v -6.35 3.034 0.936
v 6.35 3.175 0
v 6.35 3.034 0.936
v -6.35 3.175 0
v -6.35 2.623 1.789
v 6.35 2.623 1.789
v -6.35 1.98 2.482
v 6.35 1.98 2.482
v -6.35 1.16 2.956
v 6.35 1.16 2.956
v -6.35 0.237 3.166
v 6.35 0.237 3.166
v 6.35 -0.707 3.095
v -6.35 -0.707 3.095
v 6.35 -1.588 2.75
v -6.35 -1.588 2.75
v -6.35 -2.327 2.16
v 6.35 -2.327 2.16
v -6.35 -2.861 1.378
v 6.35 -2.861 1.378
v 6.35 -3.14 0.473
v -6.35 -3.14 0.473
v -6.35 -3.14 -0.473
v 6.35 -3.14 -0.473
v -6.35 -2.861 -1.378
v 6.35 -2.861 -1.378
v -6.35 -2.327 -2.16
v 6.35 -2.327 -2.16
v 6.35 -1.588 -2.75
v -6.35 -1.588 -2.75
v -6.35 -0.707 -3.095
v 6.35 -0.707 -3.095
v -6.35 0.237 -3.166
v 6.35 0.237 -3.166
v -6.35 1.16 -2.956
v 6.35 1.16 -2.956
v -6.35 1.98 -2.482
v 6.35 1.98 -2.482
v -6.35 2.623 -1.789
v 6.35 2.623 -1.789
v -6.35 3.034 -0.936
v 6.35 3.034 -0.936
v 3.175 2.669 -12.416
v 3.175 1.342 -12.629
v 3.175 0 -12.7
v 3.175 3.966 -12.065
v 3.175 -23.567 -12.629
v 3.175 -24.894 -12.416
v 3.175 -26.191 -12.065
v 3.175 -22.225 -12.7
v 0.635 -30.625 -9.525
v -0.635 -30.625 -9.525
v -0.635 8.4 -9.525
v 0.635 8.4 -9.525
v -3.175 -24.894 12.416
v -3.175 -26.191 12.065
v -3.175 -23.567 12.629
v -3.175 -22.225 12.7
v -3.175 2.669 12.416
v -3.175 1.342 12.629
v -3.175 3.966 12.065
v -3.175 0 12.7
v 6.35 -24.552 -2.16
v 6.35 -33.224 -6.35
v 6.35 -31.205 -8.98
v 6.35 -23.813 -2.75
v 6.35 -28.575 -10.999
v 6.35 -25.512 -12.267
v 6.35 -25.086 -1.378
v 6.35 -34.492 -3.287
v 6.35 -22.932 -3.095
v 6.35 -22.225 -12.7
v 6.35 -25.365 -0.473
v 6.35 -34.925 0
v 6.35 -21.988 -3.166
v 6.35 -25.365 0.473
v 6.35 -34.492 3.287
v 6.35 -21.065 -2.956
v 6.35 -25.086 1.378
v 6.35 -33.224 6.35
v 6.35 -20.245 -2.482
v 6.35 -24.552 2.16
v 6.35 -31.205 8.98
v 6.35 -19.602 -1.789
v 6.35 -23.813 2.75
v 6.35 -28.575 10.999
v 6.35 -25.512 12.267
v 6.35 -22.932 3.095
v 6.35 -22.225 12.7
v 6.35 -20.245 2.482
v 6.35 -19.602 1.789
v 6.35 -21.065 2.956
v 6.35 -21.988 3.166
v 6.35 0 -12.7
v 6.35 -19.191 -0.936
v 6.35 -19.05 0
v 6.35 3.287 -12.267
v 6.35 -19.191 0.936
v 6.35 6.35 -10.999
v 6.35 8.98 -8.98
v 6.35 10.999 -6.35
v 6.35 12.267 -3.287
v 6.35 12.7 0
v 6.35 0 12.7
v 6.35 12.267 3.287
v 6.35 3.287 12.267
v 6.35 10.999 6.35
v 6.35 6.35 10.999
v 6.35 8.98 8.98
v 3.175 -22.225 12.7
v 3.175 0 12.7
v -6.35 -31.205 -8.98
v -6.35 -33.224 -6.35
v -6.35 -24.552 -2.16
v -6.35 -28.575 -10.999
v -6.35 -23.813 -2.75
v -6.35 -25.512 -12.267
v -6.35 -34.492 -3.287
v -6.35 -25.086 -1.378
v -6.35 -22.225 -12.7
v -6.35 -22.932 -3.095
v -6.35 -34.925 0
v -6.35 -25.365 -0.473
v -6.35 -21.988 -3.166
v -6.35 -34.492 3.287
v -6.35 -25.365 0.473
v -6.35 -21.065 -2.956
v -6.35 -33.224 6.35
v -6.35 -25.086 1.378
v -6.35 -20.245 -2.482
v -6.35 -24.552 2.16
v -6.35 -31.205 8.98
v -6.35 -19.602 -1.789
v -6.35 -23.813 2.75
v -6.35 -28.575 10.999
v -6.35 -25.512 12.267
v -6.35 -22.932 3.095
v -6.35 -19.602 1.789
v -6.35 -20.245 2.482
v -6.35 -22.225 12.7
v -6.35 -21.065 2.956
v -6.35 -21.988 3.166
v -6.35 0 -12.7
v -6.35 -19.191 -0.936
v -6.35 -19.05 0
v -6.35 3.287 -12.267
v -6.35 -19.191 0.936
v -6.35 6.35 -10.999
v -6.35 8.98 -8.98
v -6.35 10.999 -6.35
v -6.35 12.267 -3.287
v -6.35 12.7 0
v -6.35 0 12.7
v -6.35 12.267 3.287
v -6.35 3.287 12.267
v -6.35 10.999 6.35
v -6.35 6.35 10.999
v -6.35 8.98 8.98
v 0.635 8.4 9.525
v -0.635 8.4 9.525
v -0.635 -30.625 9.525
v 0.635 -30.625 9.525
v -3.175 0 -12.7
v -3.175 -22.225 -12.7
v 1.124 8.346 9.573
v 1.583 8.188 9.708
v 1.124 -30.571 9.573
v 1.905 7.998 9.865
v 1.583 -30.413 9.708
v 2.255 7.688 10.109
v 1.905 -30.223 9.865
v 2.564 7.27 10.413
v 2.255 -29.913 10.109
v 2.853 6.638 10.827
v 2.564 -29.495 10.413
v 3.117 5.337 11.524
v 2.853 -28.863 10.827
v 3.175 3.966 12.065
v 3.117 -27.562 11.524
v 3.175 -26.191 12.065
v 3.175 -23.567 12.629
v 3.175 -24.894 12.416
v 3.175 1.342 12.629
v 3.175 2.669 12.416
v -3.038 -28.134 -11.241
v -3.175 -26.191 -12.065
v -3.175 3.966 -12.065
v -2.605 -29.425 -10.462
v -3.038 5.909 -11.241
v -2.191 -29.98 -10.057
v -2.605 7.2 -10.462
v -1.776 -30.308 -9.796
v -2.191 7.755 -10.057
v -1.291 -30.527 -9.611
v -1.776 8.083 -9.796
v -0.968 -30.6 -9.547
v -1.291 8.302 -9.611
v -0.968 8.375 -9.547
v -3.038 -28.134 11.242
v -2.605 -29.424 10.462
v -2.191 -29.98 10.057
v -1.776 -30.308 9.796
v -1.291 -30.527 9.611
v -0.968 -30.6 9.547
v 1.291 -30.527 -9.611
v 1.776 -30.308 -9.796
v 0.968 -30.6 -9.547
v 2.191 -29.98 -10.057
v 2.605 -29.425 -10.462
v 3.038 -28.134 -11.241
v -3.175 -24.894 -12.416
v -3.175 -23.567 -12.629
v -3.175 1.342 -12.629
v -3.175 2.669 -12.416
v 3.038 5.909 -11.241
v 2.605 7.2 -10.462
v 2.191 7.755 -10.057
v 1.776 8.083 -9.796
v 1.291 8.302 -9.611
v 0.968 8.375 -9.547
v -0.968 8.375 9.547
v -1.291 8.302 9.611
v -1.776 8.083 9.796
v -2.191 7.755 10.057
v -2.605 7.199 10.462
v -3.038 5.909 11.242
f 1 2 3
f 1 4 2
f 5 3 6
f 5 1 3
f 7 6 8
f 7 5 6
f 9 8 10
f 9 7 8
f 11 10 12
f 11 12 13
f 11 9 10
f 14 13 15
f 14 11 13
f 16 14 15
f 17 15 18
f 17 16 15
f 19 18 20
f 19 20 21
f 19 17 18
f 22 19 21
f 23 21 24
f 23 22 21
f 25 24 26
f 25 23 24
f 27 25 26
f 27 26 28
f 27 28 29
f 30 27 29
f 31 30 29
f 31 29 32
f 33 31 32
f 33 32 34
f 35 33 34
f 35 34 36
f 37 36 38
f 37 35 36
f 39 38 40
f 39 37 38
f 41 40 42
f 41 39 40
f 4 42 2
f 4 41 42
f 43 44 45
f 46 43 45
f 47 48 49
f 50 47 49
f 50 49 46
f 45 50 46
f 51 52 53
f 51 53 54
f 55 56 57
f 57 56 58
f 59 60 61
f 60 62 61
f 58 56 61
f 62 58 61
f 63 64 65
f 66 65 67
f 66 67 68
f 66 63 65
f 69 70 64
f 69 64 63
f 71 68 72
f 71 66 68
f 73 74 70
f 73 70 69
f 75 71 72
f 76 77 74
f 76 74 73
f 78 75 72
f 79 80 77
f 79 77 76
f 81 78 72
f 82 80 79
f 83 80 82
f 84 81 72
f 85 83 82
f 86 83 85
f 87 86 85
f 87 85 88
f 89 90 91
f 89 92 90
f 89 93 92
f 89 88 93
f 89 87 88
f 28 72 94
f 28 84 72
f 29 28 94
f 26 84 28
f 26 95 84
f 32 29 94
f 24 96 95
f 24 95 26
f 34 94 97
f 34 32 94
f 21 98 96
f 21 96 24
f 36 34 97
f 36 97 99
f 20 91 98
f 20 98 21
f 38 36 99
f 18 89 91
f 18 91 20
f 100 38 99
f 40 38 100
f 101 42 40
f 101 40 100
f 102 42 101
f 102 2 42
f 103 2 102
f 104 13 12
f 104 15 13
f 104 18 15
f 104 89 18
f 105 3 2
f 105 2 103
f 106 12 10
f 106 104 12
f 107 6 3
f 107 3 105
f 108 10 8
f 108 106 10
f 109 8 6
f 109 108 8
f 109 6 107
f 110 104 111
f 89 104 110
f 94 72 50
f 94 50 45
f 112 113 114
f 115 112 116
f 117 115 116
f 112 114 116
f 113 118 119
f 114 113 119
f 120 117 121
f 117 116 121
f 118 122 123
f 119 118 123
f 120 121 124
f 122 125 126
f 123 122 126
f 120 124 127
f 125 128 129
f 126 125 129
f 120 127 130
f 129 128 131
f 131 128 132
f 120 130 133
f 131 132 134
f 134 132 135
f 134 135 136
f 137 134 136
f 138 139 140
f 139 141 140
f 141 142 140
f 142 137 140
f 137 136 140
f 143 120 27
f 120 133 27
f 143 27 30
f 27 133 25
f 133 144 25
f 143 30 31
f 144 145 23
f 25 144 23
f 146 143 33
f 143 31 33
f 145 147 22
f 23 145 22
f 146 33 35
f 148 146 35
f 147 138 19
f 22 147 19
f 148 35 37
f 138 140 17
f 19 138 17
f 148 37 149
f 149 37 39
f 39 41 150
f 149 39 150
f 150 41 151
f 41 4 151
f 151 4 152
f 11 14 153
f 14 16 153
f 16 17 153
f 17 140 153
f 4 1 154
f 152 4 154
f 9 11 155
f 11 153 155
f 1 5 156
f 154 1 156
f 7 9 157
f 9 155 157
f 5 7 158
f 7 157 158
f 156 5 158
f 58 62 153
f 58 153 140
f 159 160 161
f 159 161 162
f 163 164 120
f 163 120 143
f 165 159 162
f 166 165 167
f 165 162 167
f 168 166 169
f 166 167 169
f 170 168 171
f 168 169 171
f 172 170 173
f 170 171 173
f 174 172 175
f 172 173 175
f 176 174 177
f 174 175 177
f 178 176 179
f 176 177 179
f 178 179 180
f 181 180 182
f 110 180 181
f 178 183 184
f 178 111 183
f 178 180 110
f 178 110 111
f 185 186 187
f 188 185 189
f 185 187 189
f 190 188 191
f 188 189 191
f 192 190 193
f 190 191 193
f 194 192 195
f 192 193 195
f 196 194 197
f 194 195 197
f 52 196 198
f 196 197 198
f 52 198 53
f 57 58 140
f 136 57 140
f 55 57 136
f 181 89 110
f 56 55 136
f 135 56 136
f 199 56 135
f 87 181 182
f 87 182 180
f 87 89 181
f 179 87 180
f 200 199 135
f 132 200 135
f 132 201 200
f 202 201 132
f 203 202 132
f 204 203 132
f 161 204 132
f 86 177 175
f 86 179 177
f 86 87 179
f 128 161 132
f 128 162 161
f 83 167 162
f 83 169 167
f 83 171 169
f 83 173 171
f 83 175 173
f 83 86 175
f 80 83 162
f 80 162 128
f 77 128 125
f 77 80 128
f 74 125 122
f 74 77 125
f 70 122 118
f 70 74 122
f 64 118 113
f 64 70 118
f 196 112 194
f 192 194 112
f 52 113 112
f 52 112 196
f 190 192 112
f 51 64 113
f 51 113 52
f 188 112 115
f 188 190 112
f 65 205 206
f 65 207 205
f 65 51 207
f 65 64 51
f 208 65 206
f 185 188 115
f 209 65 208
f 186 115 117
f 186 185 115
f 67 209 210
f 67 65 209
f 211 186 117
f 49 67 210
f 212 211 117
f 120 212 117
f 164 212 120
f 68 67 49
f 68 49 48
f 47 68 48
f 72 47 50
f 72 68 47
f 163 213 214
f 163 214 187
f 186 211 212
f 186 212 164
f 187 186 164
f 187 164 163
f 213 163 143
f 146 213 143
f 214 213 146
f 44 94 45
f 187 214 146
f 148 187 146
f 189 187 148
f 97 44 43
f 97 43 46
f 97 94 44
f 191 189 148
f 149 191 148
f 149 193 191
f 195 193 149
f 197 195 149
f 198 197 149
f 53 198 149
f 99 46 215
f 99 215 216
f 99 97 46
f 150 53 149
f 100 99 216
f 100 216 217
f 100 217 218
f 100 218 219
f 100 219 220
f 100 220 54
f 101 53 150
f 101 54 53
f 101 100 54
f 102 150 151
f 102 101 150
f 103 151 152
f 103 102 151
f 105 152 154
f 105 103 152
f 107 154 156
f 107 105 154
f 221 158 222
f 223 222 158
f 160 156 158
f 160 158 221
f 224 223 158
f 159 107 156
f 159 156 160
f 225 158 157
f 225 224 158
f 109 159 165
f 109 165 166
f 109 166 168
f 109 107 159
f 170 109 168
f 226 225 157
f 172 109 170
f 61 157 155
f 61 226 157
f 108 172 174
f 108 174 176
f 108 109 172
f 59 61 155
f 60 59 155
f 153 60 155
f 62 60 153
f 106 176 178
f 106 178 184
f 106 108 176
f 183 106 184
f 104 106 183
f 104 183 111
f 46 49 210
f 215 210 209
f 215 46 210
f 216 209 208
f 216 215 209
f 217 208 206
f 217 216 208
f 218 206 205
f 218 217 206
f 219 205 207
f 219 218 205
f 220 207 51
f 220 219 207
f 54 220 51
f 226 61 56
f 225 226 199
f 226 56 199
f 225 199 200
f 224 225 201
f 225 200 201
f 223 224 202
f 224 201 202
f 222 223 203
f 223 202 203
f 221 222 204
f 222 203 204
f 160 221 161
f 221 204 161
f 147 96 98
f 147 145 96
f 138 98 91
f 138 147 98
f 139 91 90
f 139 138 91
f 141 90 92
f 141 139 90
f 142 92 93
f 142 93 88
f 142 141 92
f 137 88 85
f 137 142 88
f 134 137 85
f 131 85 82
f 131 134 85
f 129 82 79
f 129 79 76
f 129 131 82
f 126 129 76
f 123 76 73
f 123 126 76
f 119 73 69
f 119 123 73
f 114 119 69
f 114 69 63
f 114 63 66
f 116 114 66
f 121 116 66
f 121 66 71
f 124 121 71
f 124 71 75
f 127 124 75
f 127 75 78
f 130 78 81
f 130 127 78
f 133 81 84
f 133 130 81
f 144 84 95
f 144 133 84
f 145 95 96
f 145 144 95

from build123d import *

# Parameters (mm, degrees)
F0_R     = 3.175
F1_DEPTH = 6.35
F2_W     = 6.35
F2_H     = 24.715454
F2_H_2   = 28.652428
F3_DEPTH = 50.8
F4_R     = 2.54


with BuildPart() as f1:
    # F0 (on Right) → F1 (new body, symmetric)
    with BuildSketch(Plane.YZ):
        with BuildLine():
            Line((-22.225, -12.7), (0, -12.7))
            ThreePointArc((0, -12.7), (12.7, 0), (0, 12.7))
            Line((0, 12.7), (-22.225, 12.7))
            ThreePointArc((-22.225, 12.7), (-34.925, 0), (-22.225, -12.7))
        make_face()
        with Locations((-22.225, 0)):
            Circle(F0_R, mode=Mode.SUBTRACT)
        Circle(F0_R, mode=Mode.SUBTRACT)
    extrude(amount=F1_DEPTH, both=True)

    # F2 (on Front) → F3 (cut, symmetric)
    with BuildSketch(Plane.XZ):
        with Locations((0, 21.882727)):
            Rectangle(F2_W, F2_H)
        with Locations((0, -23.851214)):
            Rectangle(F2_W, F2_H_2)
    extrude(amount=F3_DEPTH, both=True, mode=Mode.SUBTRACT)

    # F4
    f4_edges = [f1.edges().sort_by_distance(p)[0] for p in [
        (-3.175, -11.1125, 9.525),
        (3.175, -11.1125, 9.525),
        (-3.175, -11.1125, -9.525),
        (3.175, -11.1125, -9.525),
    ]]
    fillet(f4_edges, radius=F4_R)


solid = f1.part
